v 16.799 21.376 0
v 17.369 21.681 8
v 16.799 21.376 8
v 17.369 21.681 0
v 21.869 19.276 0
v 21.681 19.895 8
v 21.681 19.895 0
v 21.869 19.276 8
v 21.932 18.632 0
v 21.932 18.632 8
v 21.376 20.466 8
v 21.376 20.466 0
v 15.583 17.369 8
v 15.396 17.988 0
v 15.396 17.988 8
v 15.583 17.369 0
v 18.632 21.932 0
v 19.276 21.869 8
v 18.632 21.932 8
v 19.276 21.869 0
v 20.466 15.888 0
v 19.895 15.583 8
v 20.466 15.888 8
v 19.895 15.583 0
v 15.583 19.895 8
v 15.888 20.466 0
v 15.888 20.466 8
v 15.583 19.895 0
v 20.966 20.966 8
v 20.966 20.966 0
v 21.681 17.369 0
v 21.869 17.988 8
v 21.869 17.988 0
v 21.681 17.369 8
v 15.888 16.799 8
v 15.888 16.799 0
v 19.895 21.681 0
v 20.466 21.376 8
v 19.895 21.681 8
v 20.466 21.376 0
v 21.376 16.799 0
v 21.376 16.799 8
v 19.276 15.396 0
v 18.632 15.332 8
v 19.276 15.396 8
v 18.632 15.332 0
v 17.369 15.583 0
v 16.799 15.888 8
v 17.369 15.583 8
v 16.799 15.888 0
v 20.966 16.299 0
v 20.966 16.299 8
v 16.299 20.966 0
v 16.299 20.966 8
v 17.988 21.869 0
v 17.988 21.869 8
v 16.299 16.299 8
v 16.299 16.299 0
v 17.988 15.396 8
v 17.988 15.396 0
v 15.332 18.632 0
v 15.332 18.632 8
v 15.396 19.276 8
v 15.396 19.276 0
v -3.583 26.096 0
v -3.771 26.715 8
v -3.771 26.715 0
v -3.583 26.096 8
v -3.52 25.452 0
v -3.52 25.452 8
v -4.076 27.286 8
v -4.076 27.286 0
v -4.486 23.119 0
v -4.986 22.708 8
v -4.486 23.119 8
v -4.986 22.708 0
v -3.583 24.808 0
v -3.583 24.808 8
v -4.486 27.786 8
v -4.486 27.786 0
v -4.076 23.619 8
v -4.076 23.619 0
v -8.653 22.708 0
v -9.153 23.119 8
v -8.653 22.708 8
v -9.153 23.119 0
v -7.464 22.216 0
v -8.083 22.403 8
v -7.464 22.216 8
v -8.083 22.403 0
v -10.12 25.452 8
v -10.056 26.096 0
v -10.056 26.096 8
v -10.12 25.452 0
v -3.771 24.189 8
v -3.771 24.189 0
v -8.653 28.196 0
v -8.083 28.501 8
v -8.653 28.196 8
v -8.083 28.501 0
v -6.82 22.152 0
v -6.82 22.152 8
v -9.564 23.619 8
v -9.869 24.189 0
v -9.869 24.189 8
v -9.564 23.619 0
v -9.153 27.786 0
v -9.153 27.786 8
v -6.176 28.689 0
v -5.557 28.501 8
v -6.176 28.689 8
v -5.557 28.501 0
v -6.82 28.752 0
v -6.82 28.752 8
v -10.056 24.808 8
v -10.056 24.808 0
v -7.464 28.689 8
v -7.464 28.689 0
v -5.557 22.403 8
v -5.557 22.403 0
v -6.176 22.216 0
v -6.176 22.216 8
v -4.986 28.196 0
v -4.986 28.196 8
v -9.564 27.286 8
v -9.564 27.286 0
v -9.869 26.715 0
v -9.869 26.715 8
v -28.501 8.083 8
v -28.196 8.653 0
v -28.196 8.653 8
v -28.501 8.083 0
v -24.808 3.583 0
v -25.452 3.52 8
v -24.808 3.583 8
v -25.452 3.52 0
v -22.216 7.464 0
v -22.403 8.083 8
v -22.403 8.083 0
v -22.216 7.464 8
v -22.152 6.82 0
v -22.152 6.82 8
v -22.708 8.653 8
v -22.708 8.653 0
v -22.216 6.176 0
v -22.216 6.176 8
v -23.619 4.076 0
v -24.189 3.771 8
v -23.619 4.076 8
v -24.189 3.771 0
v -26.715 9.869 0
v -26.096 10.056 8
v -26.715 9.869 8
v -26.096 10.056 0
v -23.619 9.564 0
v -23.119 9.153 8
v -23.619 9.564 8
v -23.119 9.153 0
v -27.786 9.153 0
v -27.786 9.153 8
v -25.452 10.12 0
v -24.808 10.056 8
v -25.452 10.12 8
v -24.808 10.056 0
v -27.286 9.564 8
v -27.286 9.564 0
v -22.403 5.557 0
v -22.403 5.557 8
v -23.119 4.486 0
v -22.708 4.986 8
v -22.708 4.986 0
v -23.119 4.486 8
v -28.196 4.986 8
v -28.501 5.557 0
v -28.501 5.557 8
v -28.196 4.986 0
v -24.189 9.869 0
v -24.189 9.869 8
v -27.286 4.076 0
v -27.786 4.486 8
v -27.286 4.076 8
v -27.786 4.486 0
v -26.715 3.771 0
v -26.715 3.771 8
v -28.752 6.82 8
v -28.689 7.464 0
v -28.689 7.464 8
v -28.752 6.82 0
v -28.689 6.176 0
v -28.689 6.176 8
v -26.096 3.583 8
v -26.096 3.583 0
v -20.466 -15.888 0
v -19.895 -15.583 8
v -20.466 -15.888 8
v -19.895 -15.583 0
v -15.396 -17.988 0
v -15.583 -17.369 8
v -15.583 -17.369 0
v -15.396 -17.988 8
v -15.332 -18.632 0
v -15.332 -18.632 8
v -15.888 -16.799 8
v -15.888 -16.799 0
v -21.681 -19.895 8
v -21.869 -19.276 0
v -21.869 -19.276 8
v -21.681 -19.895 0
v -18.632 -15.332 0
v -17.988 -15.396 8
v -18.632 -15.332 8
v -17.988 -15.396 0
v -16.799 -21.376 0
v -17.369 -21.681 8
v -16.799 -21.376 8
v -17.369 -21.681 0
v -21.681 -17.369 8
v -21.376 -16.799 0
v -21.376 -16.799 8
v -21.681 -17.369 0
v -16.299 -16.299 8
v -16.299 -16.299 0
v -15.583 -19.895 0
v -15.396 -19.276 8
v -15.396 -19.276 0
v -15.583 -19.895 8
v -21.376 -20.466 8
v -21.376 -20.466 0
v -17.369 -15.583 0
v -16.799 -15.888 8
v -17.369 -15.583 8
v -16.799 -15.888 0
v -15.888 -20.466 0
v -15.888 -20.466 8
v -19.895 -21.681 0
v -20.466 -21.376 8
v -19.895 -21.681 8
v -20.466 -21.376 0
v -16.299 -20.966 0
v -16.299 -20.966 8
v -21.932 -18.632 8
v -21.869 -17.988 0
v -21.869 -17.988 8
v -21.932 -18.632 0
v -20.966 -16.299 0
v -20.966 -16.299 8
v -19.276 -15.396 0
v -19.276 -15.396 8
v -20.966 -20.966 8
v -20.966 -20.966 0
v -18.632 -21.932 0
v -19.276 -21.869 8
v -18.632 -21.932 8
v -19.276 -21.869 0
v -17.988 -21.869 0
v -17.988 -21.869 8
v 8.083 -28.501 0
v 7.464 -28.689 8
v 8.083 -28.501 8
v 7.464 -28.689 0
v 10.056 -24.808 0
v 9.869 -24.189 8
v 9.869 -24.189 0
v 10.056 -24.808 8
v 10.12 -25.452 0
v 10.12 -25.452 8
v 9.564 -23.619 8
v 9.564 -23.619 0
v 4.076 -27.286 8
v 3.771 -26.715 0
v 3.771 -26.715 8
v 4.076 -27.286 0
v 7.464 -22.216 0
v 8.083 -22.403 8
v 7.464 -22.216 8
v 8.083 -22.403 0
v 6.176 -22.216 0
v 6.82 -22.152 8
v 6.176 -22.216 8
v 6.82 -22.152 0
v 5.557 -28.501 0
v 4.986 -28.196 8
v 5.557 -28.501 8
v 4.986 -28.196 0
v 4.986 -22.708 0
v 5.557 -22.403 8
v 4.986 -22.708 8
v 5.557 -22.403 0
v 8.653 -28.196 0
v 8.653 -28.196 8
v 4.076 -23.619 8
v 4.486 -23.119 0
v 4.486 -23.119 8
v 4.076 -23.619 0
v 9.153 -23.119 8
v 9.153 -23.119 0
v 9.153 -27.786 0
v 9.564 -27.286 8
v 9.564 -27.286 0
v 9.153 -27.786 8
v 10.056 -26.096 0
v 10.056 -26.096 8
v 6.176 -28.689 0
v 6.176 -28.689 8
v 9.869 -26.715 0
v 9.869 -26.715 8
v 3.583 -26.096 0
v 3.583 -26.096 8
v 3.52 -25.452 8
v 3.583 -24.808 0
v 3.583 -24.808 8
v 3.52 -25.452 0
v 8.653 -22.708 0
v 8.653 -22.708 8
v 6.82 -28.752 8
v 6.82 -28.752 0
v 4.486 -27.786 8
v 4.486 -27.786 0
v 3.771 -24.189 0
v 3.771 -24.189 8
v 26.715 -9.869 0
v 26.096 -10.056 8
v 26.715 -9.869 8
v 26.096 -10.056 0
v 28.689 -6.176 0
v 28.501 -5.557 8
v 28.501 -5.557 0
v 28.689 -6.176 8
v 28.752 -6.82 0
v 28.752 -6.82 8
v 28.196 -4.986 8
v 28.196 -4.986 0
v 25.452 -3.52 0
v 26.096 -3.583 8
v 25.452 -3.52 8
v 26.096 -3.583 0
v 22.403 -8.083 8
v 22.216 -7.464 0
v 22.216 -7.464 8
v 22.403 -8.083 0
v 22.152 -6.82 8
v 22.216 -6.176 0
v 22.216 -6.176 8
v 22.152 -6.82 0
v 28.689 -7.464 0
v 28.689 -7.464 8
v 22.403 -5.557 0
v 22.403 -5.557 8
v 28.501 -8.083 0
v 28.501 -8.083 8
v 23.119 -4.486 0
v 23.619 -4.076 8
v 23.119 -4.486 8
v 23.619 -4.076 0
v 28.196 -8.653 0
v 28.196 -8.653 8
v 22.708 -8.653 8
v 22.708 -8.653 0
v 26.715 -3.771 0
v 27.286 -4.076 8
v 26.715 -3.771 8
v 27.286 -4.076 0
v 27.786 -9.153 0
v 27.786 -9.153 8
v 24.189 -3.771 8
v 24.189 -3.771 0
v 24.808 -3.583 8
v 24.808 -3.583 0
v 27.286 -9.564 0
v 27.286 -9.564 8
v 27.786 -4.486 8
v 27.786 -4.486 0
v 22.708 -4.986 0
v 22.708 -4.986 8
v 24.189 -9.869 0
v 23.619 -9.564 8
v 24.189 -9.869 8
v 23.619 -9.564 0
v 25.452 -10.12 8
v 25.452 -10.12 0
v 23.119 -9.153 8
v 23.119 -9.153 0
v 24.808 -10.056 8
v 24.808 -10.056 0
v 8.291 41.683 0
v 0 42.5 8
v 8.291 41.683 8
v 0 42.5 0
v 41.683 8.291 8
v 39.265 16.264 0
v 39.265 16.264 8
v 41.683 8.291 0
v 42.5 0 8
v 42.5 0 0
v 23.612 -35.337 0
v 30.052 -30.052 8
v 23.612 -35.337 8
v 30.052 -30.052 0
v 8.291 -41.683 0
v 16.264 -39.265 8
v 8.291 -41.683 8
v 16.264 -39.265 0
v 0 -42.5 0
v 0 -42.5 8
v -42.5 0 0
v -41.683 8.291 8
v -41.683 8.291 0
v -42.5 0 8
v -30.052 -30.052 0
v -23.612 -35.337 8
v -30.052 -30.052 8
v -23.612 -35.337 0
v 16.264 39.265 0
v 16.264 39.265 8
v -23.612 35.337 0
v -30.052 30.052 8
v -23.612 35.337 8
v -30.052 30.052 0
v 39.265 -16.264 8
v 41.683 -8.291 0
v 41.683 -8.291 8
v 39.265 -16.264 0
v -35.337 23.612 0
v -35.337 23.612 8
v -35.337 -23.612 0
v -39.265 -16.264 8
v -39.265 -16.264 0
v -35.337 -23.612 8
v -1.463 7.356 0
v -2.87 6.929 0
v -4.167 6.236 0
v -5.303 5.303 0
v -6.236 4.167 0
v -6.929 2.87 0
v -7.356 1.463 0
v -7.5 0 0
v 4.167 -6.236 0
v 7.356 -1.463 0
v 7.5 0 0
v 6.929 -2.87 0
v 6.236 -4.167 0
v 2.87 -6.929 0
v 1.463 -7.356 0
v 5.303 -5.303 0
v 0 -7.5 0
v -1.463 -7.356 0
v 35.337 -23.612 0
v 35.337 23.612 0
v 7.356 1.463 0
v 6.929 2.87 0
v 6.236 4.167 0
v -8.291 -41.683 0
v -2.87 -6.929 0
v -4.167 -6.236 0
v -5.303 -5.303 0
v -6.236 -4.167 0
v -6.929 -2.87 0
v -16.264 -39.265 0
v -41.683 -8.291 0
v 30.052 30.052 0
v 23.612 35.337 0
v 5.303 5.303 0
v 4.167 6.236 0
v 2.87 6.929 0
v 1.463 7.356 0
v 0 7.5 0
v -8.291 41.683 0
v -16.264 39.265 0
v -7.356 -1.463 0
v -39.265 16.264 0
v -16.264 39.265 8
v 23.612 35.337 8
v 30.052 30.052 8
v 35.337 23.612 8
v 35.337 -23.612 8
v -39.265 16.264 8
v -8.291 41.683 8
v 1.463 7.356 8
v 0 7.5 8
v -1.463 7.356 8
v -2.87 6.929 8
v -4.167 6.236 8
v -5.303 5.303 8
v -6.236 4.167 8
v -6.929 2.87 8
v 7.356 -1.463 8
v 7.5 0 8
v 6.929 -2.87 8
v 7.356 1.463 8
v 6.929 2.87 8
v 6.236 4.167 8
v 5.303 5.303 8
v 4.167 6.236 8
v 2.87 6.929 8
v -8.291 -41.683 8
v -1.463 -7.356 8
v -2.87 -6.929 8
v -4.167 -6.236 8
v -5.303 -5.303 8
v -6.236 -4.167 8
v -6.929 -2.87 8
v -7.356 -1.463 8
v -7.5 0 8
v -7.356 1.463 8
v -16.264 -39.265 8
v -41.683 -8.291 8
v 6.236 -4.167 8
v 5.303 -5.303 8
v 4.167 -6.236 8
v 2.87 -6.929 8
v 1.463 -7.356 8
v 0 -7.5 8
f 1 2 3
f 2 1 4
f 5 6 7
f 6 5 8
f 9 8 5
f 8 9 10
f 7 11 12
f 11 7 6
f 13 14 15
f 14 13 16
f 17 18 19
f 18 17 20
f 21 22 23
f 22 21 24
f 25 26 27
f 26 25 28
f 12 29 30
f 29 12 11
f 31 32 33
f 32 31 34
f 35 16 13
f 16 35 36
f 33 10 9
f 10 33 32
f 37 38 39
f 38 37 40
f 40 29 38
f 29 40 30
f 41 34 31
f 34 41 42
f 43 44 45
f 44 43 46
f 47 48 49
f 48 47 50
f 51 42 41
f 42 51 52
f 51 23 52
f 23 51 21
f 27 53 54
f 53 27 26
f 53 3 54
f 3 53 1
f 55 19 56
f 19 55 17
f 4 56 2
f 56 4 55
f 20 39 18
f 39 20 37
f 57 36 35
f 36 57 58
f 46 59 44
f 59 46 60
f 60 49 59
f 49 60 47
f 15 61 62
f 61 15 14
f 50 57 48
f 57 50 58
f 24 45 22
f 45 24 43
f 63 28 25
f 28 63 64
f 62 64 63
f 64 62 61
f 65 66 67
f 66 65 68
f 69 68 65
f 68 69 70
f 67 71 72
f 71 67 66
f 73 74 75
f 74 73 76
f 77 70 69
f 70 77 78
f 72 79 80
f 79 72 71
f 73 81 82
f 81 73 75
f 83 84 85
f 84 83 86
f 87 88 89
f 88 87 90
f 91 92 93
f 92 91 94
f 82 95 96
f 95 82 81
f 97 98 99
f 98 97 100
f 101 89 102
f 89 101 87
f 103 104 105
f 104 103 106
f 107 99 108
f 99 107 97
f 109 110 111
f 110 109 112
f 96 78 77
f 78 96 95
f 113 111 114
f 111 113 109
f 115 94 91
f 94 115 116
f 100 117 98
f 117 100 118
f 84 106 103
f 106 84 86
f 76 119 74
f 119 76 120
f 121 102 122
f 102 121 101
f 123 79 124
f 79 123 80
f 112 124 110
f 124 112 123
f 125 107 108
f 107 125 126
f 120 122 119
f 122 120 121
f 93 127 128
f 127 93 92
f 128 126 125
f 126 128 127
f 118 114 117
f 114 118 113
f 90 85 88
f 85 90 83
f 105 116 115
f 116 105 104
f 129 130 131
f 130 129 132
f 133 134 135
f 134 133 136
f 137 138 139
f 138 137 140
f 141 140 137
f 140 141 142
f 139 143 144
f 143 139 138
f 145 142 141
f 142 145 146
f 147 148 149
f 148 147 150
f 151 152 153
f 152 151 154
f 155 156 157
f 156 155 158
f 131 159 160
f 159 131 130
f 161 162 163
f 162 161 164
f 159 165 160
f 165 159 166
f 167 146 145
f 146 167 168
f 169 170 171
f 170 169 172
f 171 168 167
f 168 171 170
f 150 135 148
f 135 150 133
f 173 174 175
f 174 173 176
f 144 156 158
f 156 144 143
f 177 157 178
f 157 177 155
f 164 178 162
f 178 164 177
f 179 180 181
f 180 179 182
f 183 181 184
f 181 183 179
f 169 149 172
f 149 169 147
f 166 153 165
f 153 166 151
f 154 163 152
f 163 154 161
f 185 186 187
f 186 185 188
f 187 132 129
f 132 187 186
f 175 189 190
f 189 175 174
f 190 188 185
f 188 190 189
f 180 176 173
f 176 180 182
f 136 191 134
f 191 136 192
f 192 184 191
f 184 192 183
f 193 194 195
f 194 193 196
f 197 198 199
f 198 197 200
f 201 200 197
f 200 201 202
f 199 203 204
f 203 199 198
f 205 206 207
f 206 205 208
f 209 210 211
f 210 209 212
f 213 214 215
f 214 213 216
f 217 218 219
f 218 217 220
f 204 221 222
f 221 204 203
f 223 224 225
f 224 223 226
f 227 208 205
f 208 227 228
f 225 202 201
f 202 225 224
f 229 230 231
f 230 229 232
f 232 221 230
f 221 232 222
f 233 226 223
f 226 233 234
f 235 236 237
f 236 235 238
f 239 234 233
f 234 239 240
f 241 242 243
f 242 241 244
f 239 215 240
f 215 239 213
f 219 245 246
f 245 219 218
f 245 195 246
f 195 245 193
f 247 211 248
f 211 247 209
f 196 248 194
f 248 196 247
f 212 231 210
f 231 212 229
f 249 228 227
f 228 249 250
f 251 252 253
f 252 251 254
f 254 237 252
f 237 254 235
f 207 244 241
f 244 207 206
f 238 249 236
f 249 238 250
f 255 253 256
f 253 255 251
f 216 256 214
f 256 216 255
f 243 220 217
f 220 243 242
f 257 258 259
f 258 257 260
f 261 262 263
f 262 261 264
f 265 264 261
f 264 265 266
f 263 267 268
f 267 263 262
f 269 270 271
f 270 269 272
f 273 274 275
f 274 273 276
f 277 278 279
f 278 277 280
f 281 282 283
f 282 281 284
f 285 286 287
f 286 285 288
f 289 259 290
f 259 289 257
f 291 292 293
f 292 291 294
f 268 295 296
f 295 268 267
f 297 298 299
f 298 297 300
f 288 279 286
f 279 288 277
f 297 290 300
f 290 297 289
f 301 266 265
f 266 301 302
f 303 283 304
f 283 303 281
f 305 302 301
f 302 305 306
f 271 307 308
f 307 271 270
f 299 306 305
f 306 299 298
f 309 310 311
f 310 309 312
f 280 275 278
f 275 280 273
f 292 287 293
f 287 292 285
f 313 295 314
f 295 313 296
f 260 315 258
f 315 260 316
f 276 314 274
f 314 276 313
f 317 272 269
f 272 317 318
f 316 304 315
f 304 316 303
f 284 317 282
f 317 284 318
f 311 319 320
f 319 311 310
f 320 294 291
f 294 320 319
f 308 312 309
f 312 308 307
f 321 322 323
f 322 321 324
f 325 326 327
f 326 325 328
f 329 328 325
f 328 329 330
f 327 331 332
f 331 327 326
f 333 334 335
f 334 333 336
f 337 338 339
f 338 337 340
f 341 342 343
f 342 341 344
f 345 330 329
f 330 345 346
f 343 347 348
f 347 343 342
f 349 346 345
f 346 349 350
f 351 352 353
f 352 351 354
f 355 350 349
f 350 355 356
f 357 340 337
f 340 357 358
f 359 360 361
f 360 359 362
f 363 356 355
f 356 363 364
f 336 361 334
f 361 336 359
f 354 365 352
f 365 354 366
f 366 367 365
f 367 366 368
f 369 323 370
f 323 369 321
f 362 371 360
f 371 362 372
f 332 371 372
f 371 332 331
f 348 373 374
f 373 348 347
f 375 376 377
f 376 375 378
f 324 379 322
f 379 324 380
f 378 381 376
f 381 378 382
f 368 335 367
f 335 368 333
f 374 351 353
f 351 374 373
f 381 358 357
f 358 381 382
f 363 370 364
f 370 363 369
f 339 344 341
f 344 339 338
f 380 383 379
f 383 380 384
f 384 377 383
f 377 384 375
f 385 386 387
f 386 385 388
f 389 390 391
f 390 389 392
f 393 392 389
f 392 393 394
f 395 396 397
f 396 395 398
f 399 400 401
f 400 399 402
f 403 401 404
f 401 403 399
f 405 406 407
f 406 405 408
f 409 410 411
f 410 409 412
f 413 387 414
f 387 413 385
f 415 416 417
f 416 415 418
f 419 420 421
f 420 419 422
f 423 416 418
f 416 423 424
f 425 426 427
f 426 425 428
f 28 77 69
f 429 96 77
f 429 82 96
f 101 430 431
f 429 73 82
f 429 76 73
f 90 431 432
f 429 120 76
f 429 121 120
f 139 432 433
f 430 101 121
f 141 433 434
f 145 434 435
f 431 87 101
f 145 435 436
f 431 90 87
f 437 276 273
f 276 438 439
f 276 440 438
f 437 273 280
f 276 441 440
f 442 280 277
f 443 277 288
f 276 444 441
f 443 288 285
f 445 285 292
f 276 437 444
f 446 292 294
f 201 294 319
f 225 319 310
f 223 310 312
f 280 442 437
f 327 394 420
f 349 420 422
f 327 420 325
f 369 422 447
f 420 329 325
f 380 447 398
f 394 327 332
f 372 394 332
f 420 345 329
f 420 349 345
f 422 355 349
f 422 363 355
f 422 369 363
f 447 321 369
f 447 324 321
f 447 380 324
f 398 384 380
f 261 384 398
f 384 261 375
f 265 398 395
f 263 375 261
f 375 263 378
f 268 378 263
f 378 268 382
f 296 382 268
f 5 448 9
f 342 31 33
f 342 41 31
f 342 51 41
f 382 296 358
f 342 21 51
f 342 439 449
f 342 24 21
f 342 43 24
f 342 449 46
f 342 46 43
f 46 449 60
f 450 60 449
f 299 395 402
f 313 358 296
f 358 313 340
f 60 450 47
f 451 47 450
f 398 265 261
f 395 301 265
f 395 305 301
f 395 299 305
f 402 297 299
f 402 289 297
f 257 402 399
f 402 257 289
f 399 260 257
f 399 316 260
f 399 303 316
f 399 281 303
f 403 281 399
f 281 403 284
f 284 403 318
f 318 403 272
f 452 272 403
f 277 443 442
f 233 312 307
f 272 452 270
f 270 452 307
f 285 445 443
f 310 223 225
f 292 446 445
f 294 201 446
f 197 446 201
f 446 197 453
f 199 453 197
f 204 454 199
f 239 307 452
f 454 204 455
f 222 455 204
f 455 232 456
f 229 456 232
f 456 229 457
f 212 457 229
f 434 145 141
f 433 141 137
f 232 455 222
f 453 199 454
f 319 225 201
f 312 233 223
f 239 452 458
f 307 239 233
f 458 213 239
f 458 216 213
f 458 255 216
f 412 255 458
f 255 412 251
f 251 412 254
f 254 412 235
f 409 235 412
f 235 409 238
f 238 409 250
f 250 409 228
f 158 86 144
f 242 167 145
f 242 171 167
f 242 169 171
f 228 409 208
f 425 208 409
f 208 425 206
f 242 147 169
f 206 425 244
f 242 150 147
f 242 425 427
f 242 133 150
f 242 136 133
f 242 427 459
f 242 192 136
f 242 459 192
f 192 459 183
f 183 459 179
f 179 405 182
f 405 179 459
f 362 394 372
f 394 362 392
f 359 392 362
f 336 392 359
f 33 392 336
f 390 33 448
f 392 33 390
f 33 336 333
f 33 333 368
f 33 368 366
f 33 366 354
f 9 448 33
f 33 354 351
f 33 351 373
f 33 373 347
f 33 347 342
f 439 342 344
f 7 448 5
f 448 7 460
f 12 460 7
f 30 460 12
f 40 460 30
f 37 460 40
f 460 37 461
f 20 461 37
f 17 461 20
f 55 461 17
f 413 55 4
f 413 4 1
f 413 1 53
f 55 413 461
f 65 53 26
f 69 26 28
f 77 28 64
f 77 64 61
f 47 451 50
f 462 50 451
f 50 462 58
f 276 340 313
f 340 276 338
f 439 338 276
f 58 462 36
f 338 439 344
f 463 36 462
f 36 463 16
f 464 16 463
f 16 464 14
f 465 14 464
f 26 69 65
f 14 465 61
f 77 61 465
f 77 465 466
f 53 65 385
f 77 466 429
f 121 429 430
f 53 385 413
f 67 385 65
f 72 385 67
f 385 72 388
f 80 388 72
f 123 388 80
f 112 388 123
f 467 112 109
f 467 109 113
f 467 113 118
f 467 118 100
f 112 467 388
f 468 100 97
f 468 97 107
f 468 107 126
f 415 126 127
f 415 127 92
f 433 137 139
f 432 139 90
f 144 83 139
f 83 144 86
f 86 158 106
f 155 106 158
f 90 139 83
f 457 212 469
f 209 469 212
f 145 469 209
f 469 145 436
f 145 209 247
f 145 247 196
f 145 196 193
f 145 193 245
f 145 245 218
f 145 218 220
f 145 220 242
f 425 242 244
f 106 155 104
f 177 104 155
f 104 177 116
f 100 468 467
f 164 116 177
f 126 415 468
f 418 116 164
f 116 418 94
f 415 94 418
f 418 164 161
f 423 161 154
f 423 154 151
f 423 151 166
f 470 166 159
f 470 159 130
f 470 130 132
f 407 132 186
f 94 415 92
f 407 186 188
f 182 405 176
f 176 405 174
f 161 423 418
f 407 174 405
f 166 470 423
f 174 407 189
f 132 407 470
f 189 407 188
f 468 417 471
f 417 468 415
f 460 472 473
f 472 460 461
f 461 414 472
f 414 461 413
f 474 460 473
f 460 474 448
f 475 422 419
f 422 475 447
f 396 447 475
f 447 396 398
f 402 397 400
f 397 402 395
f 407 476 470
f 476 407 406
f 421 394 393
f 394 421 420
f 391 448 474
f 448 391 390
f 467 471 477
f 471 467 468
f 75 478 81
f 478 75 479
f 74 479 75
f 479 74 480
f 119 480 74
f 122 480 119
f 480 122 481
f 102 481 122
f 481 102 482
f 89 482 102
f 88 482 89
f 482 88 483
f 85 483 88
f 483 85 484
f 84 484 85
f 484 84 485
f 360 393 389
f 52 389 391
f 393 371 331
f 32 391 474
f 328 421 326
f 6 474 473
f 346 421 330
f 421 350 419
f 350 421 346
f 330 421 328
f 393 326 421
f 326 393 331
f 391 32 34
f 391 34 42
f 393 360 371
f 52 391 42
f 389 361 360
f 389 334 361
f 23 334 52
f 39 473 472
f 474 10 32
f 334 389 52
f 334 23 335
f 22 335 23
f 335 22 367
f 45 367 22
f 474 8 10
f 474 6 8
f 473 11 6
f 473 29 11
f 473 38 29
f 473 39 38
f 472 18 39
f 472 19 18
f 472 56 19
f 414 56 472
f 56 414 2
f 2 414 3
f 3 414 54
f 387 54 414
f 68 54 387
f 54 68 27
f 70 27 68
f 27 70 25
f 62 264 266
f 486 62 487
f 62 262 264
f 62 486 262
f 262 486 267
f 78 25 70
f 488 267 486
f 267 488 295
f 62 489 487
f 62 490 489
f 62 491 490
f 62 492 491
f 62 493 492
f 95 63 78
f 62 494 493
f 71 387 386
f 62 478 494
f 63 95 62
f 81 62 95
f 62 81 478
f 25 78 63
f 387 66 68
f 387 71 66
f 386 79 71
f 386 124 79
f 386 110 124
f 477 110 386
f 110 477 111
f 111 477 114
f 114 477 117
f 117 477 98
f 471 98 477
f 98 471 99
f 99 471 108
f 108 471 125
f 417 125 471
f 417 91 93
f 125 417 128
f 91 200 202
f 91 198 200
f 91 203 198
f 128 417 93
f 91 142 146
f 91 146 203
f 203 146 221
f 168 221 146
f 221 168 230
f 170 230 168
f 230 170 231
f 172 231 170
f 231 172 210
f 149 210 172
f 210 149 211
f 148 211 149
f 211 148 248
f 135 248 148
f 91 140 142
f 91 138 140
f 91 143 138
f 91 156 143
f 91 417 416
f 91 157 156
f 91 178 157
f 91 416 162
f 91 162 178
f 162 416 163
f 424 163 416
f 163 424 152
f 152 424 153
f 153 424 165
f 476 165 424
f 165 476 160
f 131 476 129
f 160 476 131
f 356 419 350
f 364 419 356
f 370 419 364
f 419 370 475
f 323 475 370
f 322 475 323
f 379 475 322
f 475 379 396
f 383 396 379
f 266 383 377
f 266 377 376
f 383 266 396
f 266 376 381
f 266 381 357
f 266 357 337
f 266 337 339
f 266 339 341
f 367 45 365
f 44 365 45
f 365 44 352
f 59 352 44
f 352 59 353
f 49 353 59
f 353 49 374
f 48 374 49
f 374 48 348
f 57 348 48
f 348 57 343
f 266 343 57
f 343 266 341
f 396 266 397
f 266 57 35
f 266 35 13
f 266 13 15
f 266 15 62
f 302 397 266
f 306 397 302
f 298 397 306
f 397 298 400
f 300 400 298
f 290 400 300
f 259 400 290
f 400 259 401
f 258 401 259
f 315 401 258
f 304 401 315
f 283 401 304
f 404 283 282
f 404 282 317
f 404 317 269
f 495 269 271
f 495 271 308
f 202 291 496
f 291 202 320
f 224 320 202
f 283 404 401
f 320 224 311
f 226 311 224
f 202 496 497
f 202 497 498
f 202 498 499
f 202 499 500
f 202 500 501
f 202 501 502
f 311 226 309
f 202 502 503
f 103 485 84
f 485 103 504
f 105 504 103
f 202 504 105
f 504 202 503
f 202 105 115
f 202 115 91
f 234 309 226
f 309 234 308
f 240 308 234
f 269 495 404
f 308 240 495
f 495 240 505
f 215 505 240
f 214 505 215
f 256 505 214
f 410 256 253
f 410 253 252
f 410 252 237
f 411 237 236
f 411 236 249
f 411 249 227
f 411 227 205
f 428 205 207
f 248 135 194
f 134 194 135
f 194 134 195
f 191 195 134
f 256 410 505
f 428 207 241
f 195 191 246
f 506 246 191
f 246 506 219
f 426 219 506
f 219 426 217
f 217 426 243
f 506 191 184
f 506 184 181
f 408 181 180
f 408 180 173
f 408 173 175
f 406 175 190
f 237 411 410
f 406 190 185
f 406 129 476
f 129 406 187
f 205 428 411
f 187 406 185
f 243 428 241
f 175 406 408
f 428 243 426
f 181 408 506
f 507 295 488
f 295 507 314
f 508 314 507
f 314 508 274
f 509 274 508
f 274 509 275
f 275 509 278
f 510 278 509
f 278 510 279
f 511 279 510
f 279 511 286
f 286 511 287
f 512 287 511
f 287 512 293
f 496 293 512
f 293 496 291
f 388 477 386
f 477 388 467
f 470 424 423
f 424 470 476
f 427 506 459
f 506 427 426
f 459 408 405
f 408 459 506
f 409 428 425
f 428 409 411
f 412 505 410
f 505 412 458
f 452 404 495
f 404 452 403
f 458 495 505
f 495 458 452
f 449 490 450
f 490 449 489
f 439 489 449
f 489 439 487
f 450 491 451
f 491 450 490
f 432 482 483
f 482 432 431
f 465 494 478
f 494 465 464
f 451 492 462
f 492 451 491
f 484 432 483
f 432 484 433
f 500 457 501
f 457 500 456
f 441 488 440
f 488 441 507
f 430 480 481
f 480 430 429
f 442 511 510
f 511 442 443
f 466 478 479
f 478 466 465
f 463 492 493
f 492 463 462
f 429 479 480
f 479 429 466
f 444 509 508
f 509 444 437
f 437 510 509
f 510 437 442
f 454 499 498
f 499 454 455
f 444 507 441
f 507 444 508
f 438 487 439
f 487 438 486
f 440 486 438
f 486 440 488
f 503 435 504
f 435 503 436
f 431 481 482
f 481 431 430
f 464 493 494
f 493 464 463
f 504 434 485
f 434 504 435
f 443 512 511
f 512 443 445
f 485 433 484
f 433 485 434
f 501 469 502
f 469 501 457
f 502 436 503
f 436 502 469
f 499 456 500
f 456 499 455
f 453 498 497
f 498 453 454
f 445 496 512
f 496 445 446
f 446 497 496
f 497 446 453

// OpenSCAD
$fn = 32;

// ----------------------------------------------------------------------
// Flange Ø85 x 8
// 6 holes on a Ø52.7 bolt circle, bolted joints
// ----------------------------------------------------------------------

// --- parameters (mm) ---
flange_d = 85;   // outside diameter of the flange
thickness = 8;   // flange thickness
holes = 6;       // number of bolt holes
pcd = 52.7;      // bolt circle diameter
start_deg = 45;  // angle of the first hole, from +X
hole_d = 6.6;    // bolt hole diameter
bore_d = 15;     // central through bore
hub_d = 23;      // hub outside diameter
hub_h = 0;       // hub height above the flange face (0 = no hub)

// --- derived feature positions (mm) ---
height = thickness + hub_h;  // = 8   overall height of the part
pcd_r = pcd / 2;             // = 26.35   bolt circle radius
hole_step = 360 / holes;     // = 60   angular pitch
feature_centers = [
  [pcd_r * cos(start_deg + 0 * hole_step), pcd_r * sin(start_deg + 0 * hole_step)],
  [pcd_r * cos(start_deg + 1 * hole_step), pcd_r * sin(start_deg + 1 * hole_step)],
  [pcd_r * cos(start_deg + 2 * hole_step), pcd_r * sin(start_deg + 2 * hole_step)],
  [pcd_r * cos(start_deg + 3 * hole_step), pcd_r * sin(start_deg + 3 * hole_step)],
  [pcd_r * cos(start_deg + 4 * hole_step), pcd_r * sin(start_deg + 4 * hole_step)],
  [pcd_r * cos(start_deg + 5 * hole_step), pcd_r * sin(start_deg + 5 * hole_step)]
];   // bolt hole centres on the pitch circle

// flange disc, every hole and the bore cut straight through
difference() {
  union() {
    cylinder(d = flange_d, h = thickness);
  }
  translate([0, 0, -1]) cylinder(d = bore_d, h = height + 2);  // bore, through
  for (centre = feature_centers)
    translate([centre[0], centre[1], -1]) cylinder(d = hole_d, h = thickness + 2);
}
